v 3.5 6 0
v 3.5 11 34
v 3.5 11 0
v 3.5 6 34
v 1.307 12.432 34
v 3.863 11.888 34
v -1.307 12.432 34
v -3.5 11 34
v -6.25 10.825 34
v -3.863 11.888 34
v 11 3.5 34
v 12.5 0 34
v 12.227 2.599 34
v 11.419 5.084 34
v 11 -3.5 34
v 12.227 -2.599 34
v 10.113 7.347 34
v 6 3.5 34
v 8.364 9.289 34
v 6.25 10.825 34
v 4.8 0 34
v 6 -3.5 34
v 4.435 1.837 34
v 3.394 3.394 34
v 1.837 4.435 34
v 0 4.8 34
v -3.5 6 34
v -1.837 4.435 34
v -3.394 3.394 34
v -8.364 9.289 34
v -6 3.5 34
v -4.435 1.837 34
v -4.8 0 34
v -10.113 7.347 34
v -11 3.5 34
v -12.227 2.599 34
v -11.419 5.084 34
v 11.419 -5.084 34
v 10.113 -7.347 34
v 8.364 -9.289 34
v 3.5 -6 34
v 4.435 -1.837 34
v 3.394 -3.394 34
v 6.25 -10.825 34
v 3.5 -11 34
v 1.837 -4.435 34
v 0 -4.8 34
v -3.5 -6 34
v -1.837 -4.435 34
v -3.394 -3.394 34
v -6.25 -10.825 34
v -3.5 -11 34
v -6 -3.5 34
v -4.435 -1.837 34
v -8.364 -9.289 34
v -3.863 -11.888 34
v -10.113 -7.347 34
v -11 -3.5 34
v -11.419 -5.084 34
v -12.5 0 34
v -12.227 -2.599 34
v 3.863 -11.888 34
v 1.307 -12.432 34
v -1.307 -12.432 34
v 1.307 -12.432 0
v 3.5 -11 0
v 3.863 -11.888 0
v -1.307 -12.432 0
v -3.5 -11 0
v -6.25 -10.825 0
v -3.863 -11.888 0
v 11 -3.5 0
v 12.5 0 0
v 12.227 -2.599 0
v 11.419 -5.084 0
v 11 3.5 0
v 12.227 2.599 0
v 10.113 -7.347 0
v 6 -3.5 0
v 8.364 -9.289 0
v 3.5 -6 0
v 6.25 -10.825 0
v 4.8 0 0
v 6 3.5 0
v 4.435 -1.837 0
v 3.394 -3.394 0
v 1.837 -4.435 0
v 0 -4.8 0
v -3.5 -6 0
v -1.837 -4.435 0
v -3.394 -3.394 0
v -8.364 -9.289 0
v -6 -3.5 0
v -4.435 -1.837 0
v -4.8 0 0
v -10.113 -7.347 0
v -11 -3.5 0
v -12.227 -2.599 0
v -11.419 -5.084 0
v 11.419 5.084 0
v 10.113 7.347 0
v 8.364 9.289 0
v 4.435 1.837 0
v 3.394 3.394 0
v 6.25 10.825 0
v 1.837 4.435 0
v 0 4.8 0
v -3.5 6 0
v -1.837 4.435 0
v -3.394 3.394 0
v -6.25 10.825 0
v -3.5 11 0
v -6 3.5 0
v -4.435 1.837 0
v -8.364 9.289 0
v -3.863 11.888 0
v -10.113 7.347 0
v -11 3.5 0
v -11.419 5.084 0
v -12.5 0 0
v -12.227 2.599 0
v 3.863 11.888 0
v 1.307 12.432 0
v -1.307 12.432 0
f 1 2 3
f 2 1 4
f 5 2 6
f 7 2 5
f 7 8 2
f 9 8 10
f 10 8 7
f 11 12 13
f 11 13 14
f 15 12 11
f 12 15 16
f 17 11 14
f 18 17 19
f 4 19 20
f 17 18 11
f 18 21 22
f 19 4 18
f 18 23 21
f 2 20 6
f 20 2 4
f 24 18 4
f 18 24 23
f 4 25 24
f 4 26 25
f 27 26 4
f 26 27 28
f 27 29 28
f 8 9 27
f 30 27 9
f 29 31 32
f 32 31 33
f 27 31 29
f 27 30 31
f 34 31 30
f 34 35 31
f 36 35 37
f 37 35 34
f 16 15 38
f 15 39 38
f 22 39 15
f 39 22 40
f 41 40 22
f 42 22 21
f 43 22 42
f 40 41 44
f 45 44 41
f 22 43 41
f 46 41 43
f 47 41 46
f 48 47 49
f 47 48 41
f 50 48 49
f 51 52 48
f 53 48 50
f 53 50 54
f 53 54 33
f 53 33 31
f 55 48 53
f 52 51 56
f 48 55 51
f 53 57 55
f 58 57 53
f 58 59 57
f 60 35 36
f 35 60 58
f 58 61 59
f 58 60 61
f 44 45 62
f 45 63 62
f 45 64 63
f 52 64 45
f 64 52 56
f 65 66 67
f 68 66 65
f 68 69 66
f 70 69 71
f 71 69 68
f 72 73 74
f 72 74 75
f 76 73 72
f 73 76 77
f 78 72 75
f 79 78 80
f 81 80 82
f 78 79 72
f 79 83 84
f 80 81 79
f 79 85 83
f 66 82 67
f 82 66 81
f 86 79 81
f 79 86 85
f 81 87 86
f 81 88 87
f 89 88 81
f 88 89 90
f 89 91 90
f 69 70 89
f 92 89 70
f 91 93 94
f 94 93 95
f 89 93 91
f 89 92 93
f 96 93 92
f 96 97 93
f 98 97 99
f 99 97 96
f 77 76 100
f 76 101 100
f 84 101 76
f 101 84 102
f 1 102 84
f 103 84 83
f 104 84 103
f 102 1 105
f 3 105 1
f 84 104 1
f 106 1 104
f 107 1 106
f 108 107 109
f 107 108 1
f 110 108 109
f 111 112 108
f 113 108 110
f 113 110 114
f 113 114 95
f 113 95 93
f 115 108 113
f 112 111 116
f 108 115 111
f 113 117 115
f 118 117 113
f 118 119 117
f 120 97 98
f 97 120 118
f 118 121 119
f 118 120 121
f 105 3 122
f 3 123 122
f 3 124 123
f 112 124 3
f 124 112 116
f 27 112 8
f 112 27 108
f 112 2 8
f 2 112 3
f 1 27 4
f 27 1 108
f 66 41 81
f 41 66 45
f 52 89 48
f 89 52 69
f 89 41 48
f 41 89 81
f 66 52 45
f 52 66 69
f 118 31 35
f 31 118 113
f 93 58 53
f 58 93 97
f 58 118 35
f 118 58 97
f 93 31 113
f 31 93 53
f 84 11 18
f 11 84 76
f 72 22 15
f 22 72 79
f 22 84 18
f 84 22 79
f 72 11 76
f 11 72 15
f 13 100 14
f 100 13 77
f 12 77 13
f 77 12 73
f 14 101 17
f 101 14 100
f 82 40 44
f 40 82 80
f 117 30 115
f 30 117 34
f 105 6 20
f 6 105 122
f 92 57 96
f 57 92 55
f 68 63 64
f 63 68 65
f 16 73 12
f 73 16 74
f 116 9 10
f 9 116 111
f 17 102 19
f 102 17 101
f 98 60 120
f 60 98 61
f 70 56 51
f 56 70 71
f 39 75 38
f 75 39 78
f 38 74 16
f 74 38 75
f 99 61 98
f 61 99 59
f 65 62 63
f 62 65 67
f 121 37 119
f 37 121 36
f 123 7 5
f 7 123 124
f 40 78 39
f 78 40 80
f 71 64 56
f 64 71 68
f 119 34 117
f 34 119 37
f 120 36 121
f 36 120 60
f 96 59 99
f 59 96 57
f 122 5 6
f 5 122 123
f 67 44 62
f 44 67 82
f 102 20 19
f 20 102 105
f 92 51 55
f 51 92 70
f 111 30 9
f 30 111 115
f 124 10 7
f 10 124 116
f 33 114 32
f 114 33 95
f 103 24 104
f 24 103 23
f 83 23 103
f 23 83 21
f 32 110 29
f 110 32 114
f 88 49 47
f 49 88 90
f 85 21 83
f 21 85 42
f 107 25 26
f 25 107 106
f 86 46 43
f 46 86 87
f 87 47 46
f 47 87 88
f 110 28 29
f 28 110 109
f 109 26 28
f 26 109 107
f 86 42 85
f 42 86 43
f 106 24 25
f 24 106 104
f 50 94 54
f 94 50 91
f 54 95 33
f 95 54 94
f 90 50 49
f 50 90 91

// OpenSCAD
module spooler_holes() {
    translate( [-3.5, 6, 0] ) {
        cube( [7, 5, 34] );
    }
    translate( [-3.5, -11, 0] ) {
        cube( [7, 5, 34] );
    }
}

module spooler() {
    difference() {
        cylinder( h=34, r=12.5 );
        cylinder( h=34, r=4.8 );
        spooler_holes();
        rotate( [0, 0, 90] ) {
            spooler_holes();
        }
    }
    
}

spooler();
